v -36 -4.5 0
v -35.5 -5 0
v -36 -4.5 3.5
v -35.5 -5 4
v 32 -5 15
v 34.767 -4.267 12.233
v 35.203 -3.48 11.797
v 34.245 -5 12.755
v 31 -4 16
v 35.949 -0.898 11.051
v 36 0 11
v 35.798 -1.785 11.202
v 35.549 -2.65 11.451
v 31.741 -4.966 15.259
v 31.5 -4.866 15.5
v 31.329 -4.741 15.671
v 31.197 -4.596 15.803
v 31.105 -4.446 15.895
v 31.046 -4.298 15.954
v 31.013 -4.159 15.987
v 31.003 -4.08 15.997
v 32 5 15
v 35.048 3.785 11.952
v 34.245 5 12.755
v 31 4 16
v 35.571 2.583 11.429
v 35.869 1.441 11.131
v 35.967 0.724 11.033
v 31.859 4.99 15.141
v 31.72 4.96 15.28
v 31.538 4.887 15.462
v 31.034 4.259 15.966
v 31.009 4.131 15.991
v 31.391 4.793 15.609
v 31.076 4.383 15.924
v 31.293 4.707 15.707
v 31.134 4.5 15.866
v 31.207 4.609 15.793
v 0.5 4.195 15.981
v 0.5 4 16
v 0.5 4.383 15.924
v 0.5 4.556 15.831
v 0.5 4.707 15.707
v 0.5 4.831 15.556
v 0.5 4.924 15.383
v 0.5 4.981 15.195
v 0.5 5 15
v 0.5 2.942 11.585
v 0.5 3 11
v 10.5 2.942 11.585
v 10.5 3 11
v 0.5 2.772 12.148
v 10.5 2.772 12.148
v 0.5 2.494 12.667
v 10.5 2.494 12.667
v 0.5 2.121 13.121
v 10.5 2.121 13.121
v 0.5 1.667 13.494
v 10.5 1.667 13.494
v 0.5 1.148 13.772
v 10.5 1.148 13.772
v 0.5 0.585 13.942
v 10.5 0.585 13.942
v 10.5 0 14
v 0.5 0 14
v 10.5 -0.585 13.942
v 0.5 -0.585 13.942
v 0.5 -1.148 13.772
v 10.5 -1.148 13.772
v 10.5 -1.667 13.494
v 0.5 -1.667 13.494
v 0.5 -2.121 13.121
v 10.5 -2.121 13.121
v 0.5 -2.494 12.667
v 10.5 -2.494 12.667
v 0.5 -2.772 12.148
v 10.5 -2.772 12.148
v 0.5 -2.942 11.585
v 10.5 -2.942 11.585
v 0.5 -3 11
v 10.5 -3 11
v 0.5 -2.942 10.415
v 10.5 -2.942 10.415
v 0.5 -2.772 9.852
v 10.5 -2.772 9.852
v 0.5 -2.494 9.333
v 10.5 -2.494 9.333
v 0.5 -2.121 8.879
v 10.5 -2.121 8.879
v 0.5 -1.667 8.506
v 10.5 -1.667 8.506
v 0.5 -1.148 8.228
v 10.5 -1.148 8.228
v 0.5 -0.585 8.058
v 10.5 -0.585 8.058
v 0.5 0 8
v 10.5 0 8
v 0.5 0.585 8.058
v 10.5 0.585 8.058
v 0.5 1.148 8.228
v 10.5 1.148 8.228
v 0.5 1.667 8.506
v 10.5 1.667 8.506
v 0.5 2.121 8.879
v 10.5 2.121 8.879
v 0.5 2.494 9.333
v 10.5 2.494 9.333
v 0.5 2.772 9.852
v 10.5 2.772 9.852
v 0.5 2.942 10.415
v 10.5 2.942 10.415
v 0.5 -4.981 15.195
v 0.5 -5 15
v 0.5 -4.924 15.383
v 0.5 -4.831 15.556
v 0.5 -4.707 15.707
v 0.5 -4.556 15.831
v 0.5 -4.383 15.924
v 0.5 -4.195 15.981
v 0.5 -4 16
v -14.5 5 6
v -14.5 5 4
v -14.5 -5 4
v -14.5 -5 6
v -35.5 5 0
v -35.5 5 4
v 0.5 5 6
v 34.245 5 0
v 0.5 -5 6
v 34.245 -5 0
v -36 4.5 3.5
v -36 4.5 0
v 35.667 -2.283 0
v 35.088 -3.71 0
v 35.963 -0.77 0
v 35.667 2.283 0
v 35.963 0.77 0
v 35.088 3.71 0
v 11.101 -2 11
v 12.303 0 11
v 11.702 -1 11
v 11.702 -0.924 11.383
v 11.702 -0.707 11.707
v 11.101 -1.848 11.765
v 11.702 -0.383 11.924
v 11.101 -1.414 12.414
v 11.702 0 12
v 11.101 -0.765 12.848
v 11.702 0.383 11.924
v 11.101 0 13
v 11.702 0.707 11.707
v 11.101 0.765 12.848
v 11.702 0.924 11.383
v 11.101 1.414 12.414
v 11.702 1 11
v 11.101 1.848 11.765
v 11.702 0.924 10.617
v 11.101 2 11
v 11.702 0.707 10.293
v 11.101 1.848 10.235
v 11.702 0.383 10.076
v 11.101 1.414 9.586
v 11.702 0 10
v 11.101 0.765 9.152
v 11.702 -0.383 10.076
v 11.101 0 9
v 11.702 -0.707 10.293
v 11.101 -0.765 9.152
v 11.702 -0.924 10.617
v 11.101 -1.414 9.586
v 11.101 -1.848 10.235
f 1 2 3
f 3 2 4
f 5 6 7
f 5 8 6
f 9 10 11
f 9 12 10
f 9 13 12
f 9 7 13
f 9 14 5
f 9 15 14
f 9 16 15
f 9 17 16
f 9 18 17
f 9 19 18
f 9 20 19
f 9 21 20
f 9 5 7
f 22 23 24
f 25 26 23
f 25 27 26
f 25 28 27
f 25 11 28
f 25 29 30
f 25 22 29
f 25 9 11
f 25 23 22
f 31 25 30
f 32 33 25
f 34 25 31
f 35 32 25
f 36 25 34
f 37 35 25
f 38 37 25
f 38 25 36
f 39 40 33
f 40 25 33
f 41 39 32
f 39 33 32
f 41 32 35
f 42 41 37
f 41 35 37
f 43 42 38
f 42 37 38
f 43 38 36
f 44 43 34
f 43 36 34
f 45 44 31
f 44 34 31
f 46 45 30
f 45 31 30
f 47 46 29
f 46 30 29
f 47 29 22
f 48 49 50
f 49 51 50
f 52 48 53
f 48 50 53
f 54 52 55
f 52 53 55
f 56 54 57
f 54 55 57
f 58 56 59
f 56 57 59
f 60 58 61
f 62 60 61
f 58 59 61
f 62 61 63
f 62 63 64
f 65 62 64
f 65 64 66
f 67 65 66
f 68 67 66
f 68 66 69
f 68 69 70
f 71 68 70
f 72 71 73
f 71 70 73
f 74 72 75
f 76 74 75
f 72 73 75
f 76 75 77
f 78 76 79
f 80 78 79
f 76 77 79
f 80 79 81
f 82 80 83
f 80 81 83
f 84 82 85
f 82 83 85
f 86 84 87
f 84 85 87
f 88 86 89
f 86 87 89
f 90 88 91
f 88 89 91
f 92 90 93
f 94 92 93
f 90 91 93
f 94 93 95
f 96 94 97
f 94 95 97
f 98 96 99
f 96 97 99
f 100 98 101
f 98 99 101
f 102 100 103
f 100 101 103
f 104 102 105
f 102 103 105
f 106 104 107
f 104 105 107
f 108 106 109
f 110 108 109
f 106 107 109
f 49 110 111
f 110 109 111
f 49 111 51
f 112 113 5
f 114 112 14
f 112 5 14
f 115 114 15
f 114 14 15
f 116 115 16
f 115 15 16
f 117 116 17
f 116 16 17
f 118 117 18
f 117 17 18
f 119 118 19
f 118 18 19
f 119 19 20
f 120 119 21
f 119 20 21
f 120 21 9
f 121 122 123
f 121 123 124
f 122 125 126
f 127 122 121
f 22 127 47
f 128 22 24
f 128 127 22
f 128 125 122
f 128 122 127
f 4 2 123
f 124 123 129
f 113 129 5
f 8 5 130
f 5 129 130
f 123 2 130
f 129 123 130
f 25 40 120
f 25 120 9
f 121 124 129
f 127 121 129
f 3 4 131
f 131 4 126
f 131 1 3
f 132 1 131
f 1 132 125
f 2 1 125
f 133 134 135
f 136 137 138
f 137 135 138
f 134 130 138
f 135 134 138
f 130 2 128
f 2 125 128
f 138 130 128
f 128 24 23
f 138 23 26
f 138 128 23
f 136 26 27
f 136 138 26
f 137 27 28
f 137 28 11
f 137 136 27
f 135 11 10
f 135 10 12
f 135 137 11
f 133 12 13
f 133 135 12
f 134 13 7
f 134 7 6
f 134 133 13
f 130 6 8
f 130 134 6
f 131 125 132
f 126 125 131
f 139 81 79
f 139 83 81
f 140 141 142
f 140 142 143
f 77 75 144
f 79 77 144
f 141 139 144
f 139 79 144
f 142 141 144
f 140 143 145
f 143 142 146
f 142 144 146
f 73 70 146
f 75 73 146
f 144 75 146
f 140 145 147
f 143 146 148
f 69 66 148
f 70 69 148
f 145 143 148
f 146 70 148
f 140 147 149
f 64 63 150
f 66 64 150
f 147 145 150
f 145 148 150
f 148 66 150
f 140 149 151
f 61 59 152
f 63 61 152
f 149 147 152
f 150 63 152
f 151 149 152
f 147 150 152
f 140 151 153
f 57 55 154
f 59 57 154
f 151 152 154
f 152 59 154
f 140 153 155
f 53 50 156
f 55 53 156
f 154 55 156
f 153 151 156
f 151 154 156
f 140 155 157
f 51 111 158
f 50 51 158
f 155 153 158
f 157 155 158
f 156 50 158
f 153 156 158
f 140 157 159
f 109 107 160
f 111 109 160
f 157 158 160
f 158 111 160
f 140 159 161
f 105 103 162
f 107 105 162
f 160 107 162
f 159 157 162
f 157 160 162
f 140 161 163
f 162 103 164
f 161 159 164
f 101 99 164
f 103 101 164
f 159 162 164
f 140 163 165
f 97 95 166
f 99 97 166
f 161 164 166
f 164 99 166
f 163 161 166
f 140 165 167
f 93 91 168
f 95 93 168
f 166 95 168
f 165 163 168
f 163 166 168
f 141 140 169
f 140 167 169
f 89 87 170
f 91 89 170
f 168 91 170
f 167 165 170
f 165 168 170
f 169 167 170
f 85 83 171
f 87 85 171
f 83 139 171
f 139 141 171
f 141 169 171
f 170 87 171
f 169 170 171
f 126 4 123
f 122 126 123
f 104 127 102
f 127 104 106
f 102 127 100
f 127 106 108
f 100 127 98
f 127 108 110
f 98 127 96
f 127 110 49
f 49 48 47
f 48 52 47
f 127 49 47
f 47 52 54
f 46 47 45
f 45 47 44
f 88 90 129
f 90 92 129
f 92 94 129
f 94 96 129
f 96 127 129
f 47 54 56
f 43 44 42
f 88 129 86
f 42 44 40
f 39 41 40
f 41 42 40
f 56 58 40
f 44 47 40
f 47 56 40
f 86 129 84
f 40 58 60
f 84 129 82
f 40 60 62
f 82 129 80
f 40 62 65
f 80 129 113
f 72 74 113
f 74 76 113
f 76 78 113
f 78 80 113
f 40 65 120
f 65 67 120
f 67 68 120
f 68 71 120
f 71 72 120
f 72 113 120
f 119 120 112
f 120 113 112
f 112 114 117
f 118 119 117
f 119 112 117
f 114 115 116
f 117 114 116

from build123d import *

# Parameters (mm, degrees)
F0_W      = 72
F0_H      = 10
F1_DEPTH  = 16
F3_DEPTH  = 25
F5_D      = 6
F5_DEPTH  = 10
F5_TIP    = 1.8025818571
F6_SIZE   = 0.5
F7_SIZE   = 5
F8_R      = 1
F10_DEPTH = 20


with BuildPart() as f1:
    # F0 (on Top) → F1 (new body)
    with BuildSketch(Plane.XY):
        Rectangle(F0_W, F0_H)
    extrude(amount=F1_DEPTH)

    # F2 (on face) → F3 (cut)
    with BuildSketch(Plane.XZ.offset(5)):
        Polygon((-36, 16), (-36, 4), (-14.5, 4), (-14.5, 6), (0.5, 6), (0.5, 16), align=None)
    extrude(amount=-F3_DEPTH, mode=Mode.SUBTRACT)

    # F5
    with Locations(Plane(origin=(0.5, 0, 0), x_dir=(0, -1, 0), z_dir=(-1, 0, 0))):
        with Locations((0, 11)):
            Hole(F5_D / 2, depth=F5_DEPTH)
            with Locations((0, 0, -(F5_DEPTH + F5_TIP / 2))):  # 118° drill point
                Cone(0, F5_D / 2, F5_TIP, mode=Mode.SUBTRACT)

    # F6
    f6_edges = [f1.edges().sort_by_distance(p)[0] for p in [
        (-36, 0, 4),
        (-36, -5, 2),
        (-36, 5, 2),
    ]]
    chamfer(f6_edges, length=F6_SIZE)

    # F7
    f7_edges = [f1.edges().sort_by_distance(p)[0] for p in [
        (36, 0, 16),
    ]]
    chamfer(f7_edges, length=F7_SIZE)

    # F8
    f8_edges = [f1.edges().sort_by_distance(p)[0] for p in [
        (15.75, -5, 16),
        (15.75, 5, 16),
    ]]
    fillet(f8_edges, radius=F8_R)

    # F9 (on Top) → F10 (cut)
    with BuildSketch(Plane.XY):
        with BuildLine():
            ThreePointArc((34.2449979984, 5), (36, 0), (34.2449979984, -5))
            Line((34.2449979984, -5), (37.1483493294, -5))
            Line((37.1483493294, -5), (37.1483493294, 5))
            Line((37.1483493294, 5), (34.2449979984, 5))
        make_face()
    extrude(amount=F10_DEPTH, mode=Mode.SUBTRACT)


solid = f1.part
